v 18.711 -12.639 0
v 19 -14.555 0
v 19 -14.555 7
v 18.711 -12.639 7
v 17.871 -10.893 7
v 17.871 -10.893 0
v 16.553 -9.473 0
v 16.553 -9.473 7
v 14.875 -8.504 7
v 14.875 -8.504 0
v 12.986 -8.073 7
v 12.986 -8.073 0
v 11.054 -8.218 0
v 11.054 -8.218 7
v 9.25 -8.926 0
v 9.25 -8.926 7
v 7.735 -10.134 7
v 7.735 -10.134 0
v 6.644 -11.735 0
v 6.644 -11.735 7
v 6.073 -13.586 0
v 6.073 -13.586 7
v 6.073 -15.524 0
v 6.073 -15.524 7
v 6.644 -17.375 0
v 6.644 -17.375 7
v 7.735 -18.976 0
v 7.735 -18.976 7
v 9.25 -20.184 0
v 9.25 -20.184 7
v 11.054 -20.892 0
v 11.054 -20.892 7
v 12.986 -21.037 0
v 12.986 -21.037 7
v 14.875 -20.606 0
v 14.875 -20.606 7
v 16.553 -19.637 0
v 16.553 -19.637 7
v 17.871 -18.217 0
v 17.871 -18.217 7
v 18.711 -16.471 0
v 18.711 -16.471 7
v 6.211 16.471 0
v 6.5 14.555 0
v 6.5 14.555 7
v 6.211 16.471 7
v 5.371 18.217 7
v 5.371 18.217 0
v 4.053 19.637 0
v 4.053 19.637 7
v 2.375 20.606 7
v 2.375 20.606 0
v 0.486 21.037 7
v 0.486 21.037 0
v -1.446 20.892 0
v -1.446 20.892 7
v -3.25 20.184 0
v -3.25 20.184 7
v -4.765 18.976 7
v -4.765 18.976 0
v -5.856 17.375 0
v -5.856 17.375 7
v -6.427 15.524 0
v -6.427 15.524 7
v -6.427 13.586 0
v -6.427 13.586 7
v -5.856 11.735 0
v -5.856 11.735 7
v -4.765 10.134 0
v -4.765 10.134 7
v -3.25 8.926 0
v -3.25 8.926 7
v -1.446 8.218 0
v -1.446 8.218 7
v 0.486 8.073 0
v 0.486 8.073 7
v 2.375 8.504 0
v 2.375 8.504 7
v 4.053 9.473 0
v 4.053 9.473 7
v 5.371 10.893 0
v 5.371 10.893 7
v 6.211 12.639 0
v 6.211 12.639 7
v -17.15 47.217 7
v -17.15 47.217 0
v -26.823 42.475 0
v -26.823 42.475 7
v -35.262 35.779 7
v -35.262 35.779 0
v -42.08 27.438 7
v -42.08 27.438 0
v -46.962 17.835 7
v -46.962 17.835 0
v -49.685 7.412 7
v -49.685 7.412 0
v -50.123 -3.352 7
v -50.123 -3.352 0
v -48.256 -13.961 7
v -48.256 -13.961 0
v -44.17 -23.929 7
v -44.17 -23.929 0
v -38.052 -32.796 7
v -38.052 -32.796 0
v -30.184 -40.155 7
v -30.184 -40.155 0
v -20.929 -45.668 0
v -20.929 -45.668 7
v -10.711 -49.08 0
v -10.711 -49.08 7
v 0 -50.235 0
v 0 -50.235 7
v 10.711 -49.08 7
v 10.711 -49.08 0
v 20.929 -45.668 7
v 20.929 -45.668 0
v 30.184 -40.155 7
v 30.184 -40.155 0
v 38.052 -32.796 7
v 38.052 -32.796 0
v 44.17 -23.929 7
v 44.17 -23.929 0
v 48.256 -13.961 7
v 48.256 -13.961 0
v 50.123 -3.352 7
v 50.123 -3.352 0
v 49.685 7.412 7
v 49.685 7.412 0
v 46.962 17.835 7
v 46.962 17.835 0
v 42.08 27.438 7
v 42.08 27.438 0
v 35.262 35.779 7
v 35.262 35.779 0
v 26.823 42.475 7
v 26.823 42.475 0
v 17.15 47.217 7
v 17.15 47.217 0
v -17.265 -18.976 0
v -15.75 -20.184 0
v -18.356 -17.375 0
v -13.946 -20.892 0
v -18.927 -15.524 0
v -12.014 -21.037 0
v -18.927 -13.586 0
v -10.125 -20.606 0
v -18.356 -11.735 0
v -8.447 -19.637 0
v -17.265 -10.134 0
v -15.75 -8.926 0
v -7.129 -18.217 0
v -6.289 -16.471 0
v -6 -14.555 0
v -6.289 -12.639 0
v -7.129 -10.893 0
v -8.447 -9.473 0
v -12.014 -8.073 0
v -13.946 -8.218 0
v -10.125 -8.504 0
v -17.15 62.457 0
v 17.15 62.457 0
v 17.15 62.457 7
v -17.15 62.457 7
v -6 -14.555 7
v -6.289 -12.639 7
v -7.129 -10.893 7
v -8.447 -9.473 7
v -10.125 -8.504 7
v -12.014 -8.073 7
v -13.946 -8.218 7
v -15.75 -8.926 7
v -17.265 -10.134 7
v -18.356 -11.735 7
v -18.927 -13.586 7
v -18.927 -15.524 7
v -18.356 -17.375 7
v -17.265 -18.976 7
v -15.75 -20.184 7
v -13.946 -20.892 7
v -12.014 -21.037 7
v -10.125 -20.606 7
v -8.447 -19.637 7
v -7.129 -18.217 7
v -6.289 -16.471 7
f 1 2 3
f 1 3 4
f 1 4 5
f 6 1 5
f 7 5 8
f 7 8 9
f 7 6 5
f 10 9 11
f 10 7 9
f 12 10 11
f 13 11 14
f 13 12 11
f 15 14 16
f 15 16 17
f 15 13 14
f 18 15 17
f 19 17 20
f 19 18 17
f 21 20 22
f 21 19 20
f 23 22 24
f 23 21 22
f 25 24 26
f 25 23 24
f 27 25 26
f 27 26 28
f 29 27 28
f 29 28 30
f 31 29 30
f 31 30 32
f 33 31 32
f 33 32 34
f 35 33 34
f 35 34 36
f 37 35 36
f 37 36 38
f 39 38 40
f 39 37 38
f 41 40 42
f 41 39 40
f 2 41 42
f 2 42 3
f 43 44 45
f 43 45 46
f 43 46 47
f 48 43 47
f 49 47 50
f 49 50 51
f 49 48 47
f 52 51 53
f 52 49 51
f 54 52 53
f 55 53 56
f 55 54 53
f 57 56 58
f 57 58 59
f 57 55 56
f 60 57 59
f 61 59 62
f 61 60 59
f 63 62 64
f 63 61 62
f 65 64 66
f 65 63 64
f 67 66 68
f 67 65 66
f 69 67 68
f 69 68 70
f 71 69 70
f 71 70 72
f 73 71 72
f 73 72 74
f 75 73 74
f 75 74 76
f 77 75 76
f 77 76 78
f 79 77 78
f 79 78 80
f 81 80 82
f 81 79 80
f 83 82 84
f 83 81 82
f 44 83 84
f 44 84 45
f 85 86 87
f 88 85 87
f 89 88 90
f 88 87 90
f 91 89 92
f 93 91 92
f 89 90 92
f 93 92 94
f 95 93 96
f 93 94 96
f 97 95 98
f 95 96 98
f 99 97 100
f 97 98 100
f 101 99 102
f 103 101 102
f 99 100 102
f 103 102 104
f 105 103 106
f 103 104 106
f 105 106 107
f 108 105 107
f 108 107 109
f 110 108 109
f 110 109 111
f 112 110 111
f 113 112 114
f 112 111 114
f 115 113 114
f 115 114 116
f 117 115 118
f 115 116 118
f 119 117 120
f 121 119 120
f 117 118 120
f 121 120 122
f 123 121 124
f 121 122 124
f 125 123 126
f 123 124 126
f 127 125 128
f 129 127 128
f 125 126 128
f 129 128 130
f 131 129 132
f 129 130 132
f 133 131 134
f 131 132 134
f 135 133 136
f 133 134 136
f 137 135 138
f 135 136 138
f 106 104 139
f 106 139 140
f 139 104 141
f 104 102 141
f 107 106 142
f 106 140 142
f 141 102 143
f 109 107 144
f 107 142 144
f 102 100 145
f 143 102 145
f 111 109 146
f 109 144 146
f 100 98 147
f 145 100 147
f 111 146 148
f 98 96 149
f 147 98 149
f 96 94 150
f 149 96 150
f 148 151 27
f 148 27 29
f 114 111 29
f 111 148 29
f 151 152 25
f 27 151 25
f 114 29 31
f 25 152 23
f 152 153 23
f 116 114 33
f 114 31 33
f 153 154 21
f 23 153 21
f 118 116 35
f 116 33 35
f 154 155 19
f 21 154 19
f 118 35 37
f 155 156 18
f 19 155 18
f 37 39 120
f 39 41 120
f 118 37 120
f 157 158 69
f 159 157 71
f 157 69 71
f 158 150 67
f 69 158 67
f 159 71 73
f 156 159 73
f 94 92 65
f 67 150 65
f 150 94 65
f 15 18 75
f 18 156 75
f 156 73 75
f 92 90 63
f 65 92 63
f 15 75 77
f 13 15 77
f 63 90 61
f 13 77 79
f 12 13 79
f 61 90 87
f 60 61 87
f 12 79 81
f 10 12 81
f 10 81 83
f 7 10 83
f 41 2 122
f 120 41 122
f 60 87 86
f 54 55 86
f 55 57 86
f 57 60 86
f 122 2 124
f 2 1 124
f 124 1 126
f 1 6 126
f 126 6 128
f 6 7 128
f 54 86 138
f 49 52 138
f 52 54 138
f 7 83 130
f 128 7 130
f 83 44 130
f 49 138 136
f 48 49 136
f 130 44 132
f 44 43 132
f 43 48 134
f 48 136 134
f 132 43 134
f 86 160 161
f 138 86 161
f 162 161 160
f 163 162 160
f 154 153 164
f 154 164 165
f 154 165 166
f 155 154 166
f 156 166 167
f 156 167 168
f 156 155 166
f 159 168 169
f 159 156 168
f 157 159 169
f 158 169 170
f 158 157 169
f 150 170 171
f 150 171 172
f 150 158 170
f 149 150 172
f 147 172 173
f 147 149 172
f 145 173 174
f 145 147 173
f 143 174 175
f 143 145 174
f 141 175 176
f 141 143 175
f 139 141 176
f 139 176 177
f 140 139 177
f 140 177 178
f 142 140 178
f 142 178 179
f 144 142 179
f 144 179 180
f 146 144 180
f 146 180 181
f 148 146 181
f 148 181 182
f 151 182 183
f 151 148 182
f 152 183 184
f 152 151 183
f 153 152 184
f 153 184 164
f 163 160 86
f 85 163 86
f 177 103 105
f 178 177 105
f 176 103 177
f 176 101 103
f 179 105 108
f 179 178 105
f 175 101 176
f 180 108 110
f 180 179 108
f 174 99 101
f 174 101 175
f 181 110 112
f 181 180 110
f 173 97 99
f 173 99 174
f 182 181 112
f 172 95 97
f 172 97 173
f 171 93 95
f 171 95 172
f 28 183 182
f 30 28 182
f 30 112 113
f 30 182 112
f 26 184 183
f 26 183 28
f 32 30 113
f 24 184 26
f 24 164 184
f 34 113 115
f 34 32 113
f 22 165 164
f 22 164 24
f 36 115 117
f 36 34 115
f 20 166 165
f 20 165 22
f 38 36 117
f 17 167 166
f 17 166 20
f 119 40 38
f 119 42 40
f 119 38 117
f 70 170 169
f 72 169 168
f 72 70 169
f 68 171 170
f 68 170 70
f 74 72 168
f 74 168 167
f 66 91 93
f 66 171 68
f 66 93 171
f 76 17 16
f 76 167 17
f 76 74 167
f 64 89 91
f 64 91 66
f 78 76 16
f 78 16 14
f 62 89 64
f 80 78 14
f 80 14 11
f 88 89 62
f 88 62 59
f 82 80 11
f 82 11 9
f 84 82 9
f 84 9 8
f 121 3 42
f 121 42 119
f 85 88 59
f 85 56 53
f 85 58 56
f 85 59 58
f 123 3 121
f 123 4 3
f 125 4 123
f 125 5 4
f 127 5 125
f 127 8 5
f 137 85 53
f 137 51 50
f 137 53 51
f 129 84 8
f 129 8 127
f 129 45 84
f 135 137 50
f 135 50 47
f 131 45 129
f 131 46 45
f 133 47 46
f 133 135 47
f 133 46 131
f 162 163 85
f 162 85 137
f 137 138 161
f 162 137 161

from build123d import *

# Parameters (mm, degrees)
F0_R     = 6.5
F1_DEPTH = 7


with BuildPart() as f1:
    # F0 (on Top) → F1 (new body)
    with BuildSketch(Plane.XY):
        with BuildLine():
            Line((-17.15, 62.456869), (-17.15, 47.216869))
            ThreePointArc((-17.15, 47.216869), (0, -50.235), (17.15, 47.216869))
            Line((17.15, 47.216869), (17.15, 62.456869))
            Line((17.15, 62.456869), (0, 62.456869))
            Line((0, 62.456869), (-17.15, 62.456869))
        make_face()
        with Locations((-12.5, -14.555)):
            Circle(F0_R, mode=Mode.SUBTRACT)
        with Locations((12.5, -14.555)):
            Circle(F0_R, mode=Mode.SUBTRACT)
        with Locations((0, 14.555)):
            Circle(F0_R, mode=Mode.SUBTRACT)
    extrude(amount=F1_DEPTH)


solid = f1.part
